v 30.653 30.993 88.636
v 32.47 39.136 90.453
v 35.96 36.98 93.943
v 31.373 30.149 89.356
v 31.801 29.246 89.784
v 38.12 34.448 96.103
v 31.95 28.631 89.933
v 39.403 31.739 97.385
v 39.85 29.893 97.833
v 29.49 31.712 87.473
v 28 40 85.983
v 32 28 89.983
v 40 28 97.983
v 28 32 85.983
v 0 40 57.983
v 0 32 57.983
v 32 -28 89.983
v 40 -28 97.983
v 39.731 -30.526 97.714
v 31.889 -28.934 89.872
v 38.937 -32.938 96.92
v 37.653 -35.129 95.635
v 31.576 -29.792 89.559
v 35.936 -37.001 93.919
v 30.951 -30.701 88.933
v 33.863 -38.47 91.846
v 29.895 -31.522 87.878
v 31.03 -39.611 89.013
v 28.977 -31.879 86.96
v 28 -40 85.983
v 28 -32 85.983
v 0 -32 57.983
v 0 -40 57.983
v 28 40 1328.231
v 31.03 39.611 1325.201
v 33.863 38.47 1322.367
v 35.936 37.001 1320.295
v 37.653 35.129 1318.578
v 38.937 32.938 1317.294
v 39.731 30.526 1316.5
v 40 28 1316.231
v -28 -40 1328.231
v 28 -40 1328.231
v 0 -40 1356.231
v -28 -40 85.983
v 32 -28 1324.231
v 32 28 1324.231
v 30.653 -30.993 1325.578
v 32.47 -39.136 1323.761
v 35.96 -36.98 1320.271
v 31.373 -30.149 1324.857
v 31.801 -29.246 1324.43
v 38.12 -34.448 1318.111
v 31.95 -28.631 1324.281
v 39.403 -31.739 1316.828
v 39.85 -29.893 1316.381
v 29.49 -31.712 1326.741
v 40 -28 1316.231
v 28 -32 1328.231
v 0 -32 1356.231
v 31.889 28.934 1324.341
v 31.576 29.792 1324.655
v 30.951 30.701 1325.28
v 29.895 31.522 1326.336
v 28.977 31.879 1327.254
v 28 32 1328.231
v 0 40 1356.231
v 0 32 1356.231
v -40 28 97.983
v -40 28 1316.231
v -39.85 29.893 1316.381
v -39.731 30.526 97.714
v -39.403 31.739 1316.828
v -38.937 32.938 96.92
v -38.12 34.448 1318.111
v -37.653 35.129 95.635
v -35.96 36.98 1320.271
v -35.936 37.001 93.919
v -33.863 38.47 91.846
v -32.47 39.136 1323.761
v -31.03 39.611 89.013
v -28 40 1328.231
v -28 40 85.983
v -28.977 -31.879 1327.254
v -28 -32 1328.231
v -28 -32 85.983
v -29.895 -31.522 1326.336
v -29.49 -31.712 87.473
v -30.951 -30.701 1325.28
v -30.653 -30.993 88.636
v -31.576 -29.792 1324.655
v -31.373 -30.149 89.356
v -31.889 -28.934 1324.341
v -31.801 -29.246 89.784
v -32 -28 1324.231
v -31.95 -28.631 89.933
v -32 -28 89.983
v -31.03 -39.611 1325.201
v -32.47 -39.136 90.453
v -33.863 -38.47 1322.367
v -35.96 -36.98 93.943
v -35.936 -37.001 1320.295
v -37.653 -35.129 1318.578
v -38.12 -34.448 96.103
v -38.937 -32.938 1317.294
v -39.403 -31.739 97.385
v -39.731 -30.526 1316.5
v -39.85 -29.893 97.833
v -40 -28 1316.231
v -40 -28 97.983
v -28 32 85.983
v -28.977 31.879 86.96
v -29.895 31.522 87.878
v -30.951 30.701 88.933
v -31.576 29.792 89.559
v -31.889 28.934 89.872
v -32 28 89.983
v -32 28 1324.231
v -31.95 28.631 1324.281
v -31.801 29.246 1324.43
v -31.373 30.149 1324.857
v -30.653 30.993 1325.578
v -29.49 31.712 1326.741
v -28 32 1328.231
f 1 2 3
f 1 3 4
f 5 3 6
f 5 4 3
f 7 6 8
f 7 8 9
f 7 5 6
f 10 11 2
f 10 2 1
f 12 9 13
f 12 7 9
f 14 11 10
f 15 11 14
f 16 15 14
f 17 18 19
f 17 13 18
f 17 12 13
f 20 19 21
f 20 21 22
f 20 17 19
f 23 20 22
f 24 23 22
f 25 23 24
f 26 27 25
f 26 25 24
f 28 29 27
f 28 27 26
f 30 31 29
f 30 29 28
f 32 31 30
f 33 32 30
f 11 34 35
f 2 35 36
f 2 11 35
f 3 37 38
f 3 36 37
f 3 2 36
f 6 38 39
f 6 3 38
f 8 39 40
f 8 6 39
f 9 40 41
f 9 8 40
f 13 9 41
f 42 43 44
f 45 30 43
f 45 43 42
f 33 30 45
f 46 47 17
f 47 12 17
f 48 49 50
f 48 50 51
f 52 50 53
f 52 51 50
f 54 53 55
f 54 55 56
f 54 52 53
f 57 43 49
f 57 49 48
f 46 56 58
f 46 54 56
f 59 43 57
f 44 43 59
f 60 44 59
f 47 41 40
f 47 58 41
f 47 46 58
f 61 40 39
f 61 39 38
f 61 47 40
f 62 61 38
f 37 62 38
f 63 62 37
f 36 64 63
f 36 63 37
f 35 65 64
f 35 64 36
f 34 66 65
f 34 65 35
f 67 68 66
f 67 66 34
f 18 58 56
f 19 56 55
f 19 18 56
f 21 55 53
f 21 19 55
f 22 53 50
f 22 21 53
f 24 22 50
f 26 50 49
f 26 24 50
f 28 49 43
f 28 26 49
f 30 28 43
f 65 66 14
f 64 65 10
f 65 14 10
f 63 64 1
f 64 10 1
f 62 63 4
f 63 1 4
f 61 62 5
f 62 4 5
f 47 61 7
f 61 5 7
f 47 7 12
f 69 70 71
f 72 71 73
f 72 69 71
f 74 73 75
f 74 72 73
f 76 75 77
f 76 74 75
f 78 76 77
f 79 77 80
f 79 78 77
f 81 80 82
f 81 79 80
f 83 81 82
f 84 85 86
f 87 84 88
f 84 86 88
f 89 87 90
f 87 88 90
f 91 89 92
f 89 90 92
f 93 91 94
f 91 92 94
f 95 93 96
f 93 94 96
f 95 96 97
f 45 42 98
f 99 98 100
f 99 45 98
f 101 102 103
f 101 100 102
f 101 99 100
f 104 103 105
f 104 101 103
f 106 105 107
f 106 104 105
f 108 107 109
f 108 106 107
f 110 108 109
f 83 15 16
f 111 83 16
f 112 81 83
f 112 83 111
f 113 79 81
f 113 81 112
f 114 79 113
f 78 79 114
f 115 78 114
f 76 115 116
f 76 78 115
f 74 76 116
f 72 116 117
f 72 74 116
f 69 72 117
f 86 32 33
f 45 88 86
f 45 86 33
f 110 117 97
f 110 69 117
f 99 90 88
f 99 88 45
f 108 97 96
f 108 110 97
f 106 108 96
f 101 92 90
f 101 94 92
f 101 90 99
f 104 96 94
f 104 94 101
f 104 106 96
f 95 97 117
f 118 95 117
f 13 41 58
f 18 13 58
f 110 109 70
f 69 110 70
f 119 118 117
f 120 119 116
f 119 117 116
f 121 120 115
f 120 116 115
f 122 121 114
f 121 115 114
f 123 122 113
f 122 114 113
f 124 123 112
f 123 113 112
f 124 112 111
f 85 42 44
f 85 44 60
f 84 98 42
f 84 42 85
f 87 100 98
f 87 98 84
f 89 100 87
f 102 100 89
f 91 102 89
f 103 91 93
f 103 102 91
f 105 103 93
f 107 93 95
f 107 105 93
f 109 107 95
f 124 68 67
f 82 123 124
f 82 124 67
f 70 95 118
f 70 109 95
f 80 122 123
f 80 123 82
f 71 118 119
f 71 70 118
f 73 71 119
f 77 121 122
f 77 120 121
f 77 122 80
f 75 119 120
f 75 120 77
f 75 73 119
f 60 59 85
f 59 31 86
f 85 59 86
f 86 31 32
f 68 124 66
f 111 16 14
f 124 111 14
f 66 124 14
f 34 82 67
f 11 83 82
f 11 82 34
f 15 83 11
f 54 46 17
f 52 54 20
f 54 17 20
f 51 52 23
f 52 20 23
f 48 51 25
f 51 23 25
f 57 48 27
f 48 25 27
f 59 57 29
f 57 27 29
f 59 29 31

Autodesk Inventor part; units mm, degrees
ref_plane "Start Plane" through (0, 0, 57.9828) normal (0, 0, 1) x (1, 0, 0)
ref_plane "End Plane" through (0, 0, 1356.2308) normal (0, 0, 1) x (1, 0, 0)
sketch "Sketch" plane through (0, 0, 0) normal (0, 0, 1) x (1, 0, 0)
  line L0 (-40, -28) -> (-40, 28)
  line L1 (-28, 40) -> (28, 40)
  line L2 (40, 28) -> (40, -28)
  line L3 (28, -40) -> (-28, -40)
  arc A0 (-40, -28) -> (-28, -40) centre (-28, -28) ccw
  arc A1 (-28, 40) -> (-40, 28) centre (-28, 28) ccw
  arc A2 (40, 28) -> (28, 40) centre (28, 28) ccw
  arc A3 (28, -40) -> (40, -28) centre (28, -28) ccw
  arc A4 (-28, 32) -> (-32, 28) centre (-28, 28) ccw
  line L4 (-28, 32) -> (28, 32)
  arc A5 (32, 28) -> (28, 32) centre (28, 28) ccw
  line L5 (32, 28) -> (32, -28)
  arc A6 (28, -32) -> (32, -28) centre (28, -28) ccw
  line L6 (28, -32) -> (-28, -32)
  arc A7 (-32, -28) -> (-28, -32) centre (-28, -28) ccw
  line L7 (-32, -28) -> (-32, 28)
  line L8 (0, 59.4794) -> (0, -59.4794) construction
  line L9 (-59.4794, 0) -> (59.4794, 0) construction
  dimension "d7" = 12
  dimension "d10" = 80
  dimension "d11" = 80
  dimension "d12" = 8
  dimension "d15" = 40
  dimension "d16" = 40
extrude "Body" add sketch "Sketch" along normal up to surface (1298.2481 mm away) from surface at 57.9828
sketch "Sketch3" plane through (0, 0, 0) normal (0, 0, 1) x (1, 0, 0)
  line L0 (0, 0) -> (10, 0)
ref_plane "Work Plane3" through (0, 0, 0) normal (0, -1, 0) x (1, 0, 0)
ref_plane "Work Plane4" through (-678.1154, 28, 678.1154) normal (-0.7071, 0, 0.7071) x (0.7071, 0, 0.7071)
split "Split1" plane through (-678.1154, 28, 678.1154) removes the side toward (-0.7071, 0, 0.7071)
ref_plane "Work Plane5" through (678.1154, 28, 736.0982) normal (0.7071, 0, -0.7071) x (-0.7071, 0, -0.7071)
split "Split2" plane through (678.1154, 28, 736.0982) removes the side toward (0.7071, 0, -0.7071)
ref_plane "Work Plane6" through (-28.9914, 28, 1385.2222) normal (0.7071, 0, 0.7071) x (0.7071, 0, -0.7071)
split "Split3" plane through (-28.9914, 28, 1385.2222) removes the side toward (0.7071, 0, 0.7071)
ref_plane "Work Plane7" through (-678.1154, -28, 736.0982) normal (-0.7071, 0, -0.7071) x (-0.7071, 0, 0.7071)
split "Split4" plane through (-678.1154, -28, 736.0982) removes the side toward (-0.7071, 0, -0.7071)
sketch "Sketch4" plane through (0, 0, 0) normal (0, -1, 0) x (1, 0, 0)
  line L0 (-2, 57.9828) -> (12, 57.9828) projected
  line L1 (-2, 1356.2308) -> (12, 1356.2308) projected
  dimension "d18" = 1298.248
equation "\"d7\" = G_IR"
equation "\"d10\" = G_H"
equation "\"d11\" = G_W"
equation "\"d12\" = G_T"
equation "\"d15\" = 0.5 * d10"
equation "\"d16\" = 0.5 * d11"
equation "\"d3\" = G_L"
equation "\"G_W\" = 80"
equation "\"G_H\" = 80"
equation "\"G_T\" = 8"
equation "\"G_IR\" = 12"
equation "\"G_L\" = d18"
equation "\"G_OFFSET_START\" = -57.98276"
equation "\"G_OFFSET_END\" = -57.98276"
equation "\"d13\" = -G_OFFSET_START"
equation "\"d14\" = G_OFFSET_END + B_L"
equation "\"B_L\" = 1414.21356"
properties part number "ISO 12633-2 - 80x80x8 - 1298.25" material "Steel, Mild"
